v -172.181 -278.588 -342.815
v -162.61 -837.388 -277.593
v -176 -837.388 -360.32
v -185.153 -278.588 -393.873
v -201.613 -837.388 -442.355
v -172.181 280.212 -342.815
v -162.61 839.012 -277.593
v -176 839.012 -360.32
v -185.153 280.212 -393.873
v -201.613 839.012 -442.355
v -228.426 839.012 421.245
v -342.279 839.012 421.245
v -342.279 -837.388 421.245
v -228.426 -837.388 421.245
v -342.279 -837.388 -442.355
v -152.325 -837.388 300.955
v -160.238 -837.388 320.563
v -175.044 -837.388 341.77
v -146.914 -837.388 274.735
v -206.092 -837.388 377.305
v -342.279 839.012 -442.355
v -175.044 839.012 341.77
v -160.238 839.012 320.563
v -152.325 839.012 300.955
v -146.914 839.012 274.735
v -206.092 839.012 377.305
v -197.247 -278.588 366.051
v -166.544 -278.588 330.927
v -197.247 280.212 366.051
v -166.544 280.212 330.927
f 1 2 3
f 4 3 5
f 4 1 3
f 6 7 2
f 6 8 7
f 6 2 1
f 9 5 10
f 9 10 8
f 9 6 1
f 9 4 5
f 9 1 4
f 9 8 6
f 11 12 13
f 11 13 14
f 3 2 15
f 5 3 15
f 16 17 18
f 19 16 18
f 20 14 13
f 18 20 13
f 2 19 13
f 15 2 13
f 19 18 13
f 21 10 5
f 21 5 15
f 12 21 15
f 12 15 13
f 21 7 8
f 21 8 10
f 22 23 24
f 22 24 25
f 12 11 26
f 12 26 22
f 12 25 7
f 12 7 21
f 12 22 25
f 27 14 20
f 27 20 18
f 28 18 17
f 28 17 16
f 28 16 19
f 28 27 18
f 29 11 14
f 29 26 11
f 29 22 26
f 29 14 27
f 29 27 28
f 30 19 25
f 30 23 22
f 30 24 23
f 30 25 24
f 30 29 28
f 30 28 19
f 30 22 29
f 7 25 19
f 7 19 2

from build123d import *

# Parameters (mm, degrees)
F1_DEPTH = 177.8
F2_R     = 50.8
F4_DEPTH = 1676.4


with BuildPart() as f1:
    # F0 (on Right) → F1 (new body)
    with BuildSketch(Plane.YZ):
        with BuildLine():
            add(Edge.make_bspline(
                [(757.3677897453, 430.6074678898), (773.7689614296, 408.6542957115), (839.0123964927, 368.5044864347), (839.0123964927, 295.3796386719)],
                knots=[0, 0, 0, 0, 157.9633109488, 157.9633109488, 157.9633109488, 157.9633109488], degree=3))
            Line((757.3677897453, 430.6074678898), (-839.0123964927, 430.6074678898))
            Line((-839.0123964927, 430.6074678898), (-839.0123964927, -430.6074678898))
            Line((-839.0123964927, -430.6074678898), (-839.0123964927, -456.0074678898))
            Line((-839.0123964927, -456.0074678898), (-601.4769821503, -456.0074678898))
            add(Edge.make_bspline(
                [(-601.4769821503, -456.0074678898), (-562.1427297592, -455.1187157631), (-541.7929887772, -443.0595934391), (-536.967917018, -406.0792799859)],
                knots=[0, 0, 0, 0, 81.5735461508, 81.5735461508, 81.5735461508, 81.5735461508], degree=3))
            ThreePointArc((-536.967917018, -406.0792799859), (-258.1997910033, -122.9745139814), (63.6125510645, -355.9912367912))
            ThreePointArc((63.6125510645, -355.9912367912), (64.9345219834, -361.7820753858), (66.1433977712, -367.5975751983))
            add(Edge.make_bspline(
                [(66.1433977712, -367.5975751983), (79.3549297873, -412.2478035768), (127.0050581979, -426.72), (163.3523256442, -426.72)],
                knots=[9.2699794157, 9.2699794157, 9.2699794157, 9.2699794157, 122.2725667444, 122.2725667444, 122.2725667444, 122.2725667444], degree=3))
            Line((163.3523256442, -426.72), (737.405538559, -426.72))
            add(Edge.make_bspline(
                [(737.405538559, -426.72), (796.8827855437, -426.72), (828.529104676, -398.0098366737), (839.0123964927, -323.7623274326)],
                knots=[0, 0, 0, 0, 144.6521203428, 144.6521203428, 144.6521203428, 144.6521203428], degree=3))
            Line((839.0123964927, -323.7623274326), (839.0123964927, 295.3796386719))
        make_face()
    extrude(amount=F1_DEPTH)

    # F2
    f2_edges = [f1.edges().sort_by_distance(p)[0] for p in [
        (177.8, 839.012396, -14.191344),
    ]]
    fillet(f2_edges, radius=F2_R)


with BuildPart() as f4:
    # F3 (on face) → F4 (new body)
    with BuildSketch(Plane(origin=(0, 839.0123964927, 0), x_dir=(-1, 0, 0), z_dir=(0, 1, 0))):
        with BuildLine():
            Line((342.2788688957, 421.2450157881), (228.425770998, 421.2450157881))
            add(Edge.make_bspline(
                [(228.425770998, 421.2450157881), (200.5402892828, 342.3034548759), (157.4753234207, 355.173677206), (146.9143778086, 274.7348248959)],
                knots=[0, 0, 0, 0, 167.6584124193, 167.6584124193, 167.6584124193, 167.6584124193], degree=3))
            Line((146.9143778086, 274.7348248959), (162.6101124127, -277.5926335351))
            add(Edge.make_bspline(
                [(162.6101124127, -277.5926335351), (170.5097854137, -353.7607491016), (183.3800077438, -391.2988901138), (201.612830162, -442.3549842119)],
                knots=[0, 0, 0, 0, 169.3158119976, 169.3158119976, 169.3158119976, 169.3158119976], degree=3))
            Line((201.612830162, -442.3549842119), (342.2788688957, -442.3549842119))
            Line((342.2788688957, -442.3549842119), (342.2788688957, 421.2450157881))
        make_face()
    extrude(amount=-F4_DEPTH)


solid = f4.part
